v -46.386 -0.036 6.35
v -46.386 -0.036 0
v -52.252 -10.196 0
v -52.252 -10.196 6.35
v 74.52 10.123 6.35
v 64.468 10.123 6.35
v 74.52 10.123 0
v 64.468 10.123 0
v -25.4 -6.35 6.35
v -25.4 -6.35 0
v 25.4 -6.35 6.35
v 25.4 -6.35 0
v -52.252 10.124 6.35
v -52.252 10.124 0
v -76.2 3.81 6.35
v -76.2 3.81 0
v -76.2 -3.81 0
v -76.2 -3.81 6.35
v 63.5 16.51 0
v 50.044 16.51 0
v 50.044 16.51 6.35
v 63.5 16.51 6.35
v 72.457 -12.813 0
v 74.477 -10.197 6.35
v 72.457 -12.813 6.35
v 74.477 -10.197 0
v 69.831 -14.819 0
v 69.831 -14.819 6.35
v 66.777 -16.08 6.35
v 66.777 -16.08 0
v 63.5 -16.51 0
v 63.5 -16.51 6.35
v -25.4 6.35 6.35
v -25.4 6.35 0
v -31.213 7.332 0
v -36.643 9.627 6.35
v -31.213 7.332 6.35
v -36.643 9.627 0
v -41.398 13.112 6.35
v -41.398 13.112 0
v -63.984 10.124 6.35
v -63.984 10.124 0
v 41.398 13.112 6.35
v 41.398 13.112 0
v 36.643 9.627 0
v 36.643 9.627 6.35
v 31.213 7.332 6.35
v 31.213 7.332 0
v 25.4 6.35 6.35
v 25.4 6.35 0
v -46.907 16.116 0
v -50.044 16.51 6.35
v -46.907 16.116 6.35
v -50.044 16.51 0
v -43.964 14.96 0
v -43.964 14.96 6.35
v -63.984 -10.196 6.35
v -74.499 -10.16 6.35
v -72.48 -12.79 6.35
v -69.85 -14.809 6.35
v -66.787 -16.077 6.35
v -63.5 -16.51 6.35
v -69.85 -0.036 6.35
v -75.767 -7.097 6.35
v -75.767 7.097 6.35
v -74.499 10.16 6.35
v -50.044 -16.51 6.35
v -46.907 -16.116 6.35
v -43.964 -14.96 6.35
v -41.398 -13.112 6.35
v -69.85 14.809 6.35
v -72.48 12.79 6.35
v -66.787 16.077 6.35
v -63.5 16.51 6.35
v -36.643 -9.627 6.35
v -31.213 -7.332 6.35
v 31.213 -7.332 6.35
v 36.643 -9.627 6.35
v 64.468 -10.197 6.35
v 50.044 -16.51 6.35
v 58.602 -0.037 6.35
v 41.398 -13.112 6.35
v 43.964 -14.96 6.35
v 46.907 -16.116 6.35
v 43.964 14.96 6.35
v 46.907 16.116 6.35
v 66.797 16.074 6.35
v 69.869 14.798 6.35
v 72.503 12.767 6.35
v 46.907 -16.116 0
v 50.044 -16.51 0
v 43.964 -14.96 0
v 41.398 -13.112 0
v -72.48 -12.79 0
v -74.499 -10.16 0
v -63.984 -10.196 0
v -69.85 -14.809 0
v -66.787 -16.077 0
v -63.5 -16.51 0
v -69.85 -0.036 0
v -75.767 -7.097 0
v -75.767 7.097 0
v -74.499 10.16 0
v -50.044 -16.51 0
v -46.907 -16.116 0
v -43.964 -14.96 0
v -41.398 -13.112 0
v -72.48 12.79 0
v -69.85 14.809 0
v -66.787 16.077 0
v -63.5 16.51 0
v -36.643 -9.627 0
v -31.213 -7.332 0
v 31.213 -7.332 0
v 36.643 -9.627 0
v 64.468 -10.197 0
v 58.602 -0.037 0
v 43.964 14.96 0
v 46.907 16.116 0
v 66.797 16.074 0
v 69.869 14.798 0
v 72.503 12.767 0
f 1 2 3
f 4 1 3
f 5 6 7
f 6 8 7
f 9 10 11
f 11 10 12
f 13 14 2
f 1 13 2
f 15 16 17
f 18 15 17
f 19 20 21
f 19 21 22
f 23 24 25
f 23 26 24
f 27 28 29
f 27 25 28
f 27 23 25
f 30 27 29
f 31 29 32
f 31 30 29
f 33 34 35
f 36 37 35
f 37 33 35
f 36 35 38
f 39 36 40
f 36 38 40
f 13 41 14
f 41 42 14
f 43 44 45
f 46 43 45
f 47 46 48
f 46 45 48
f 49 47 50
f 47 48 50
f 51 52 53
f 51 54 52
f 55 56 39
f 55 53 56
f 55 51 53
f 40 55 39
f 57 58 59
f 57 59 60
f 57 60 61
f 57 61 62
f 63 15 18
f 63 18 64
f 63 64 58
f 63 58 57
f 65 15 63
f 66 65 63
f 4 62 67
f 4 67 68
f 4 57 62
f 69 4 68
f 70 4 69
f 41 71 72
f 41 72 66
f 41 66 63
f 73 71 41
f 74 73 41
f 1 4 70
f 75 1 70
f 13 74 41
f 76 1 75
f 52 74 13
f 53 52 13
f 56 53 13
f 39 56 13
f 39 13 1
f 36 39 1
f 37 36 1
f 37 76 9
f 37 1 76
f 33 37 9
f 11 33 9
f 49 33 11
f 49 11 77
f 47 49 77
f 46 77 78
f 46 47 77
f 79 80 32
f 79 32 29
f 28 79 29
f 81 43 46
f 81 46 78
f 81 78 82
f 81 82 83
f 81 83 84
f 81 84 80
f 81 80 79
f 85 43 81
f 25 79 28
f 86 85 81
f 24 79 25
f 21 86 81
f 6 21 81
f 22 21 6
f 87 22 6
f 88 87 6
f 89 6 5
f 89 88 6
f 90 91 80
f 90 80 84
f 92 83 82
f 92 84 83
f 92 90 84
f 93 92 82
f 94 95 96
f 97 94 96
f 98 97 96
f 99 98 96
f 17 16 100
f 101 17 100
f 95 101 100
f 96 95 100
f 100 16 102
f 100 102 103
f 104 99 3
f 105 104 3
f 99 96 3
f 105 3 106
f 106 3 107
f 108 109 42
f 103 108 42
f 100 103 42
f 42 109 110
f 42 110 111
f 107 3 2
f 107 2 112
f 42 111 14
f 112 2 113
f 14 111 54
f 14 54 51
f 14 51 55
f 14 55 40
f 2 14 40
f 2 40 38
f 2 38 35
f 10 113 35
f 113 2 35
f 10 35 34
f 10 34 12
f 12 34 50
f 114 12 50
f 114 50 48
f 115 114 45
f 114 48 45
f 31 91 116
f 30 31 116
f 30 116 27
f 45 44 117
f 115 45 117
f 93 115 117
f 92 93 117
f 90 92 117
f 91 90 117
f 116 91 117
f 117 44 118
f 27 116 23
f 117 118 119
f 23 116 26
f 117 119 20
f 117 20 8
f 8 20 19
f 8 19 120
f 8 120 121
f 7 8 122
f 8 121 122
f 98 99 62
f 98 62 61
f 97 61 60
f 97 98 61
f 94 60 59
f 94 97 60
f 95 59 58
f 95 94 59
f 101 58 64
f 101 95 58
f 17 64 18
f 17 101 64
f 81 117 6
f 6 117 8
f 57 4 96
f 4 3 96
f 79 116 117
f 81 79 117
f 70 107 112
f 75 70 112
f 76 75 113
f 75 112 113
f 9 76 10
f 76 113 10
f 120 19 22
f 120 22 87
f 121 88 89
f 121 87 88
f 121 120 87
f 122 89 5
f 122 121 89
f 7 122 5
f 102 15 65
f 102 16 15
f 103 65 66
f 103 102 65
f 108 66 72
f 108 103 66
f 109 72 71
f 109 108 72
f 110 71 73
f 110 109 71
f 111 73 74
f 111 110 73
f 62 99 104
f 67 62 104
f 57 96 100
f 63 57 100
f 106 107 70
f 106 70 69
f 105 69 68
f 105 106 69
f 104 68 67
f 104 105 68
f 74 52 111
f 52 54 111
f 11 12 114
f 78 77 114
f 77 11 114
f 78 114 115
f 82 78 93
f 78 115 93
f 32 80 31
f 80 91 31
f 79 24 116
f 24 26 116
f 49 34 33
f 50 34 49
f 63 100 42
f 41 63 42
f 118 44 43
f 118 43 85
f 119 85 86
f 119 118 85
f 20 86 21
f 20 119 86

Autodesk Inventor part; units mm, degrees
ref_plane "YZ Plane" through (0, 0, 0) normal (1, 0, 0) x (0, 1, 0)
ref_plane "XZ Plane" through (0, 0, 0) normal (0, 1, 0) x (-1, 0, 0)
ref_plane "XY Plane" through (0, 0, 0) normal (0, 0, 1) x (1, 0, 0)
sketch "Sketch1" plane through (0, 0, 0) normal (0, 0, 1) x (1, 0, 0)
  line L0 (-50.0439, 16.51) -> (-63.5, 16.51)
  line L1 (-76.2, 3.81) -> (-76.2, -3.81)
  line L2 (-76.2, -16.51) -> (76.2, 16.51) construction
  line L3 (76.2, -16.51) -> (-76.2, 16.51) construction
  line L4 (-52.2524, 10.1244) -> (-46.3865, -0.0356)
  line L5 (-46.3865, -0.0356) -> (-52.2524, -10.1956)
  line L6 (-52.2524, -10.1956) -> (-63.9841, -10.1956)
  line L7 (-63.9841, -10.1956) -> (-69.85, -0.0356)
  line L8 (-69.85, -0.0356) -> (-63.9841, 10.1244)
  line L9 (-63.9841, 10.1244) -> (-52.2524, 10.1244)
  line L10 (76.2009, -10.1956) -> (76.2, -10.1972)
  line L11 (74.477, -10.1972) -> (64.4682, -10.1972)
  line L12 (64.4682, -10.1972) -> (58.6024, -0.0372)
  line L13 (58.6024, -0.0372) -> (64.4682, 10.1228)
  line L14 (64.4682, 10.1228) -> (74.5199, 10.1228)
  line L15 (-25.4, -6.35) -> (25.4, -6.35) construction
  line L16 (25.4, -6.35) -> (25.4, 6.35) construction
  line L17 (25.4, 6.35) -> (-25.4, 6.35) construction
  line L18 (-25.4, 6.35) -> (-25.4, -6.35) construction
  line L19 (-25.4, -6.35) -> (25.4, 6.35) construction
  line L20 (25.4, -6.35) -> (-25.4, 6.35) construction
  line L21 (-44.45, 16.51) -> (-44.45, -16.51) construction
  line L22 (44.45, 16.51) -> (44.45, -16.51) construction
  arc A0 (-41.3977, 13.1123) -> (-25.4, 6.35) centre (-24.1053, 31.717) ccw
  arc A1 (-25.4, -6.35) -> (-41.3977, -13.1123) centre (-24.1053, -31.717) ccw
  arc A2 (25.4, 6.35) -> (41.3977, 13.1123) centre (24.1053, 31.717) ccw
  arc A3 (41.3977, -13.1123) -> (25.4, -6.35) centre (24.1053, -31.717) ccw
  line L23 (-25.4, 6.35) -> (25.4, 6.35)
  line L24 (-25.4, -6.35) -> (25.4, -6.35)
  arc A4 (-41.3977, 13.1123) -> (-50.0439, 16.51) centre (-50.0439, 3.81) ccw
  line L25 (-63.5, -16.51) -> (-50.0439, -16.51)
  line L26 (50.0439, -16.51) -> (63.5, -16.51)
  arc A5 (-50.0439, -16.51) -> (-41.3977, -13.1123) centre (-50.0439, -3.81) ccw
  arc A6 (41.3977, -13.1123) -> (50.0439, -16.51) centre (50.0439, -3.81) ccw
  line L27 (50.0439, 16.51) -> (63.5, 16.51)
  arc A7 (50.0439, 16.51) -> (41.3977, 13.1123) centre (50.0439, 3.81) ccw
  arc A8 (41.3977, -13.1123) -> (50.0439, -16.51) centre (50.0439, -3.81) ccw
  arc A9 (-63.5, 16.51) -> (-76.2, 3.81) centre (-63.5, 3.81) ccw
  arc A10 (-76.2, -3.81) -> (-63.5, -16.51) centre (-63.5, -3.81) ccw
  arc A11 (63.5, -16.51) -> (74.477, -10.1972) centre (63.5, -3.81) ccw
  arc A12 (74.5199, 10.1228) -> (63.5, 16.51) centre (63.5, 3.81) ccw
  line L28 (76.2, -10.1972) -> (76.2, -10.1956) construction
  line L29 (76.2, -10.1956) -> (76.2, -10.1972)
  point P0 (0, 0)
  point P1 (-58.1182, -0.0356)
  point P2 (70.3341, -0.0372)
  point P3 (76.2, 6.35)
  point P4 (41.3977, -13.1123)
  point P5 (50.0439, -16.51)
  dimension "totalLength" = 152.4
  dimension "maxWidth" = 33.02
  dimension "boltWidth" = 20.32
  dimension "d3" = 6.35
  dimension "d4" = 20.32
  dimension "handleLength" = 50.8
  dimension "handleWidth" = 12.7
  dimension "endOfHandle" = 44.45
  dimension "d8" = 44.45
  dimension "arcRadius" = 25.4
  dimension "d10" = 25.4
  dimension "d11" = 25.4
  dimension "outerFillet" = 12.7
  dimension "d15" = 12.7
  dimension "d16" = 12.7
  dimension "d17" = 12.7
extrude "Extrusion1" add sketch "Sketch1" along normal blind 6.35
equation "\"maxWidth\" = boltWidth + 2 * minWallThickness"
equation "\"boltWidth\" = boltSize + boltGap"
equation "\"d3\" = minWallThickness"
equation "\"d4\" = boltWidth"
equation "\"endOfHandle\" = 0.5 * handleLength + boltSize"
equation "\"d8\" = endOfHandle"
equation "\"d15\" = outerFillet"
equation "\"d16\" = outerFillet"
equation "\"d17\" = outerFillet"
equation "\"d18\" = minWallThickness"
equation "\"minWallThickness\" = 6.35"
equation "\"boltGap\" = 1.27"
equation "\"boltSize\" = 19.05"
properties part number "3_4_inchWrenchV01"
